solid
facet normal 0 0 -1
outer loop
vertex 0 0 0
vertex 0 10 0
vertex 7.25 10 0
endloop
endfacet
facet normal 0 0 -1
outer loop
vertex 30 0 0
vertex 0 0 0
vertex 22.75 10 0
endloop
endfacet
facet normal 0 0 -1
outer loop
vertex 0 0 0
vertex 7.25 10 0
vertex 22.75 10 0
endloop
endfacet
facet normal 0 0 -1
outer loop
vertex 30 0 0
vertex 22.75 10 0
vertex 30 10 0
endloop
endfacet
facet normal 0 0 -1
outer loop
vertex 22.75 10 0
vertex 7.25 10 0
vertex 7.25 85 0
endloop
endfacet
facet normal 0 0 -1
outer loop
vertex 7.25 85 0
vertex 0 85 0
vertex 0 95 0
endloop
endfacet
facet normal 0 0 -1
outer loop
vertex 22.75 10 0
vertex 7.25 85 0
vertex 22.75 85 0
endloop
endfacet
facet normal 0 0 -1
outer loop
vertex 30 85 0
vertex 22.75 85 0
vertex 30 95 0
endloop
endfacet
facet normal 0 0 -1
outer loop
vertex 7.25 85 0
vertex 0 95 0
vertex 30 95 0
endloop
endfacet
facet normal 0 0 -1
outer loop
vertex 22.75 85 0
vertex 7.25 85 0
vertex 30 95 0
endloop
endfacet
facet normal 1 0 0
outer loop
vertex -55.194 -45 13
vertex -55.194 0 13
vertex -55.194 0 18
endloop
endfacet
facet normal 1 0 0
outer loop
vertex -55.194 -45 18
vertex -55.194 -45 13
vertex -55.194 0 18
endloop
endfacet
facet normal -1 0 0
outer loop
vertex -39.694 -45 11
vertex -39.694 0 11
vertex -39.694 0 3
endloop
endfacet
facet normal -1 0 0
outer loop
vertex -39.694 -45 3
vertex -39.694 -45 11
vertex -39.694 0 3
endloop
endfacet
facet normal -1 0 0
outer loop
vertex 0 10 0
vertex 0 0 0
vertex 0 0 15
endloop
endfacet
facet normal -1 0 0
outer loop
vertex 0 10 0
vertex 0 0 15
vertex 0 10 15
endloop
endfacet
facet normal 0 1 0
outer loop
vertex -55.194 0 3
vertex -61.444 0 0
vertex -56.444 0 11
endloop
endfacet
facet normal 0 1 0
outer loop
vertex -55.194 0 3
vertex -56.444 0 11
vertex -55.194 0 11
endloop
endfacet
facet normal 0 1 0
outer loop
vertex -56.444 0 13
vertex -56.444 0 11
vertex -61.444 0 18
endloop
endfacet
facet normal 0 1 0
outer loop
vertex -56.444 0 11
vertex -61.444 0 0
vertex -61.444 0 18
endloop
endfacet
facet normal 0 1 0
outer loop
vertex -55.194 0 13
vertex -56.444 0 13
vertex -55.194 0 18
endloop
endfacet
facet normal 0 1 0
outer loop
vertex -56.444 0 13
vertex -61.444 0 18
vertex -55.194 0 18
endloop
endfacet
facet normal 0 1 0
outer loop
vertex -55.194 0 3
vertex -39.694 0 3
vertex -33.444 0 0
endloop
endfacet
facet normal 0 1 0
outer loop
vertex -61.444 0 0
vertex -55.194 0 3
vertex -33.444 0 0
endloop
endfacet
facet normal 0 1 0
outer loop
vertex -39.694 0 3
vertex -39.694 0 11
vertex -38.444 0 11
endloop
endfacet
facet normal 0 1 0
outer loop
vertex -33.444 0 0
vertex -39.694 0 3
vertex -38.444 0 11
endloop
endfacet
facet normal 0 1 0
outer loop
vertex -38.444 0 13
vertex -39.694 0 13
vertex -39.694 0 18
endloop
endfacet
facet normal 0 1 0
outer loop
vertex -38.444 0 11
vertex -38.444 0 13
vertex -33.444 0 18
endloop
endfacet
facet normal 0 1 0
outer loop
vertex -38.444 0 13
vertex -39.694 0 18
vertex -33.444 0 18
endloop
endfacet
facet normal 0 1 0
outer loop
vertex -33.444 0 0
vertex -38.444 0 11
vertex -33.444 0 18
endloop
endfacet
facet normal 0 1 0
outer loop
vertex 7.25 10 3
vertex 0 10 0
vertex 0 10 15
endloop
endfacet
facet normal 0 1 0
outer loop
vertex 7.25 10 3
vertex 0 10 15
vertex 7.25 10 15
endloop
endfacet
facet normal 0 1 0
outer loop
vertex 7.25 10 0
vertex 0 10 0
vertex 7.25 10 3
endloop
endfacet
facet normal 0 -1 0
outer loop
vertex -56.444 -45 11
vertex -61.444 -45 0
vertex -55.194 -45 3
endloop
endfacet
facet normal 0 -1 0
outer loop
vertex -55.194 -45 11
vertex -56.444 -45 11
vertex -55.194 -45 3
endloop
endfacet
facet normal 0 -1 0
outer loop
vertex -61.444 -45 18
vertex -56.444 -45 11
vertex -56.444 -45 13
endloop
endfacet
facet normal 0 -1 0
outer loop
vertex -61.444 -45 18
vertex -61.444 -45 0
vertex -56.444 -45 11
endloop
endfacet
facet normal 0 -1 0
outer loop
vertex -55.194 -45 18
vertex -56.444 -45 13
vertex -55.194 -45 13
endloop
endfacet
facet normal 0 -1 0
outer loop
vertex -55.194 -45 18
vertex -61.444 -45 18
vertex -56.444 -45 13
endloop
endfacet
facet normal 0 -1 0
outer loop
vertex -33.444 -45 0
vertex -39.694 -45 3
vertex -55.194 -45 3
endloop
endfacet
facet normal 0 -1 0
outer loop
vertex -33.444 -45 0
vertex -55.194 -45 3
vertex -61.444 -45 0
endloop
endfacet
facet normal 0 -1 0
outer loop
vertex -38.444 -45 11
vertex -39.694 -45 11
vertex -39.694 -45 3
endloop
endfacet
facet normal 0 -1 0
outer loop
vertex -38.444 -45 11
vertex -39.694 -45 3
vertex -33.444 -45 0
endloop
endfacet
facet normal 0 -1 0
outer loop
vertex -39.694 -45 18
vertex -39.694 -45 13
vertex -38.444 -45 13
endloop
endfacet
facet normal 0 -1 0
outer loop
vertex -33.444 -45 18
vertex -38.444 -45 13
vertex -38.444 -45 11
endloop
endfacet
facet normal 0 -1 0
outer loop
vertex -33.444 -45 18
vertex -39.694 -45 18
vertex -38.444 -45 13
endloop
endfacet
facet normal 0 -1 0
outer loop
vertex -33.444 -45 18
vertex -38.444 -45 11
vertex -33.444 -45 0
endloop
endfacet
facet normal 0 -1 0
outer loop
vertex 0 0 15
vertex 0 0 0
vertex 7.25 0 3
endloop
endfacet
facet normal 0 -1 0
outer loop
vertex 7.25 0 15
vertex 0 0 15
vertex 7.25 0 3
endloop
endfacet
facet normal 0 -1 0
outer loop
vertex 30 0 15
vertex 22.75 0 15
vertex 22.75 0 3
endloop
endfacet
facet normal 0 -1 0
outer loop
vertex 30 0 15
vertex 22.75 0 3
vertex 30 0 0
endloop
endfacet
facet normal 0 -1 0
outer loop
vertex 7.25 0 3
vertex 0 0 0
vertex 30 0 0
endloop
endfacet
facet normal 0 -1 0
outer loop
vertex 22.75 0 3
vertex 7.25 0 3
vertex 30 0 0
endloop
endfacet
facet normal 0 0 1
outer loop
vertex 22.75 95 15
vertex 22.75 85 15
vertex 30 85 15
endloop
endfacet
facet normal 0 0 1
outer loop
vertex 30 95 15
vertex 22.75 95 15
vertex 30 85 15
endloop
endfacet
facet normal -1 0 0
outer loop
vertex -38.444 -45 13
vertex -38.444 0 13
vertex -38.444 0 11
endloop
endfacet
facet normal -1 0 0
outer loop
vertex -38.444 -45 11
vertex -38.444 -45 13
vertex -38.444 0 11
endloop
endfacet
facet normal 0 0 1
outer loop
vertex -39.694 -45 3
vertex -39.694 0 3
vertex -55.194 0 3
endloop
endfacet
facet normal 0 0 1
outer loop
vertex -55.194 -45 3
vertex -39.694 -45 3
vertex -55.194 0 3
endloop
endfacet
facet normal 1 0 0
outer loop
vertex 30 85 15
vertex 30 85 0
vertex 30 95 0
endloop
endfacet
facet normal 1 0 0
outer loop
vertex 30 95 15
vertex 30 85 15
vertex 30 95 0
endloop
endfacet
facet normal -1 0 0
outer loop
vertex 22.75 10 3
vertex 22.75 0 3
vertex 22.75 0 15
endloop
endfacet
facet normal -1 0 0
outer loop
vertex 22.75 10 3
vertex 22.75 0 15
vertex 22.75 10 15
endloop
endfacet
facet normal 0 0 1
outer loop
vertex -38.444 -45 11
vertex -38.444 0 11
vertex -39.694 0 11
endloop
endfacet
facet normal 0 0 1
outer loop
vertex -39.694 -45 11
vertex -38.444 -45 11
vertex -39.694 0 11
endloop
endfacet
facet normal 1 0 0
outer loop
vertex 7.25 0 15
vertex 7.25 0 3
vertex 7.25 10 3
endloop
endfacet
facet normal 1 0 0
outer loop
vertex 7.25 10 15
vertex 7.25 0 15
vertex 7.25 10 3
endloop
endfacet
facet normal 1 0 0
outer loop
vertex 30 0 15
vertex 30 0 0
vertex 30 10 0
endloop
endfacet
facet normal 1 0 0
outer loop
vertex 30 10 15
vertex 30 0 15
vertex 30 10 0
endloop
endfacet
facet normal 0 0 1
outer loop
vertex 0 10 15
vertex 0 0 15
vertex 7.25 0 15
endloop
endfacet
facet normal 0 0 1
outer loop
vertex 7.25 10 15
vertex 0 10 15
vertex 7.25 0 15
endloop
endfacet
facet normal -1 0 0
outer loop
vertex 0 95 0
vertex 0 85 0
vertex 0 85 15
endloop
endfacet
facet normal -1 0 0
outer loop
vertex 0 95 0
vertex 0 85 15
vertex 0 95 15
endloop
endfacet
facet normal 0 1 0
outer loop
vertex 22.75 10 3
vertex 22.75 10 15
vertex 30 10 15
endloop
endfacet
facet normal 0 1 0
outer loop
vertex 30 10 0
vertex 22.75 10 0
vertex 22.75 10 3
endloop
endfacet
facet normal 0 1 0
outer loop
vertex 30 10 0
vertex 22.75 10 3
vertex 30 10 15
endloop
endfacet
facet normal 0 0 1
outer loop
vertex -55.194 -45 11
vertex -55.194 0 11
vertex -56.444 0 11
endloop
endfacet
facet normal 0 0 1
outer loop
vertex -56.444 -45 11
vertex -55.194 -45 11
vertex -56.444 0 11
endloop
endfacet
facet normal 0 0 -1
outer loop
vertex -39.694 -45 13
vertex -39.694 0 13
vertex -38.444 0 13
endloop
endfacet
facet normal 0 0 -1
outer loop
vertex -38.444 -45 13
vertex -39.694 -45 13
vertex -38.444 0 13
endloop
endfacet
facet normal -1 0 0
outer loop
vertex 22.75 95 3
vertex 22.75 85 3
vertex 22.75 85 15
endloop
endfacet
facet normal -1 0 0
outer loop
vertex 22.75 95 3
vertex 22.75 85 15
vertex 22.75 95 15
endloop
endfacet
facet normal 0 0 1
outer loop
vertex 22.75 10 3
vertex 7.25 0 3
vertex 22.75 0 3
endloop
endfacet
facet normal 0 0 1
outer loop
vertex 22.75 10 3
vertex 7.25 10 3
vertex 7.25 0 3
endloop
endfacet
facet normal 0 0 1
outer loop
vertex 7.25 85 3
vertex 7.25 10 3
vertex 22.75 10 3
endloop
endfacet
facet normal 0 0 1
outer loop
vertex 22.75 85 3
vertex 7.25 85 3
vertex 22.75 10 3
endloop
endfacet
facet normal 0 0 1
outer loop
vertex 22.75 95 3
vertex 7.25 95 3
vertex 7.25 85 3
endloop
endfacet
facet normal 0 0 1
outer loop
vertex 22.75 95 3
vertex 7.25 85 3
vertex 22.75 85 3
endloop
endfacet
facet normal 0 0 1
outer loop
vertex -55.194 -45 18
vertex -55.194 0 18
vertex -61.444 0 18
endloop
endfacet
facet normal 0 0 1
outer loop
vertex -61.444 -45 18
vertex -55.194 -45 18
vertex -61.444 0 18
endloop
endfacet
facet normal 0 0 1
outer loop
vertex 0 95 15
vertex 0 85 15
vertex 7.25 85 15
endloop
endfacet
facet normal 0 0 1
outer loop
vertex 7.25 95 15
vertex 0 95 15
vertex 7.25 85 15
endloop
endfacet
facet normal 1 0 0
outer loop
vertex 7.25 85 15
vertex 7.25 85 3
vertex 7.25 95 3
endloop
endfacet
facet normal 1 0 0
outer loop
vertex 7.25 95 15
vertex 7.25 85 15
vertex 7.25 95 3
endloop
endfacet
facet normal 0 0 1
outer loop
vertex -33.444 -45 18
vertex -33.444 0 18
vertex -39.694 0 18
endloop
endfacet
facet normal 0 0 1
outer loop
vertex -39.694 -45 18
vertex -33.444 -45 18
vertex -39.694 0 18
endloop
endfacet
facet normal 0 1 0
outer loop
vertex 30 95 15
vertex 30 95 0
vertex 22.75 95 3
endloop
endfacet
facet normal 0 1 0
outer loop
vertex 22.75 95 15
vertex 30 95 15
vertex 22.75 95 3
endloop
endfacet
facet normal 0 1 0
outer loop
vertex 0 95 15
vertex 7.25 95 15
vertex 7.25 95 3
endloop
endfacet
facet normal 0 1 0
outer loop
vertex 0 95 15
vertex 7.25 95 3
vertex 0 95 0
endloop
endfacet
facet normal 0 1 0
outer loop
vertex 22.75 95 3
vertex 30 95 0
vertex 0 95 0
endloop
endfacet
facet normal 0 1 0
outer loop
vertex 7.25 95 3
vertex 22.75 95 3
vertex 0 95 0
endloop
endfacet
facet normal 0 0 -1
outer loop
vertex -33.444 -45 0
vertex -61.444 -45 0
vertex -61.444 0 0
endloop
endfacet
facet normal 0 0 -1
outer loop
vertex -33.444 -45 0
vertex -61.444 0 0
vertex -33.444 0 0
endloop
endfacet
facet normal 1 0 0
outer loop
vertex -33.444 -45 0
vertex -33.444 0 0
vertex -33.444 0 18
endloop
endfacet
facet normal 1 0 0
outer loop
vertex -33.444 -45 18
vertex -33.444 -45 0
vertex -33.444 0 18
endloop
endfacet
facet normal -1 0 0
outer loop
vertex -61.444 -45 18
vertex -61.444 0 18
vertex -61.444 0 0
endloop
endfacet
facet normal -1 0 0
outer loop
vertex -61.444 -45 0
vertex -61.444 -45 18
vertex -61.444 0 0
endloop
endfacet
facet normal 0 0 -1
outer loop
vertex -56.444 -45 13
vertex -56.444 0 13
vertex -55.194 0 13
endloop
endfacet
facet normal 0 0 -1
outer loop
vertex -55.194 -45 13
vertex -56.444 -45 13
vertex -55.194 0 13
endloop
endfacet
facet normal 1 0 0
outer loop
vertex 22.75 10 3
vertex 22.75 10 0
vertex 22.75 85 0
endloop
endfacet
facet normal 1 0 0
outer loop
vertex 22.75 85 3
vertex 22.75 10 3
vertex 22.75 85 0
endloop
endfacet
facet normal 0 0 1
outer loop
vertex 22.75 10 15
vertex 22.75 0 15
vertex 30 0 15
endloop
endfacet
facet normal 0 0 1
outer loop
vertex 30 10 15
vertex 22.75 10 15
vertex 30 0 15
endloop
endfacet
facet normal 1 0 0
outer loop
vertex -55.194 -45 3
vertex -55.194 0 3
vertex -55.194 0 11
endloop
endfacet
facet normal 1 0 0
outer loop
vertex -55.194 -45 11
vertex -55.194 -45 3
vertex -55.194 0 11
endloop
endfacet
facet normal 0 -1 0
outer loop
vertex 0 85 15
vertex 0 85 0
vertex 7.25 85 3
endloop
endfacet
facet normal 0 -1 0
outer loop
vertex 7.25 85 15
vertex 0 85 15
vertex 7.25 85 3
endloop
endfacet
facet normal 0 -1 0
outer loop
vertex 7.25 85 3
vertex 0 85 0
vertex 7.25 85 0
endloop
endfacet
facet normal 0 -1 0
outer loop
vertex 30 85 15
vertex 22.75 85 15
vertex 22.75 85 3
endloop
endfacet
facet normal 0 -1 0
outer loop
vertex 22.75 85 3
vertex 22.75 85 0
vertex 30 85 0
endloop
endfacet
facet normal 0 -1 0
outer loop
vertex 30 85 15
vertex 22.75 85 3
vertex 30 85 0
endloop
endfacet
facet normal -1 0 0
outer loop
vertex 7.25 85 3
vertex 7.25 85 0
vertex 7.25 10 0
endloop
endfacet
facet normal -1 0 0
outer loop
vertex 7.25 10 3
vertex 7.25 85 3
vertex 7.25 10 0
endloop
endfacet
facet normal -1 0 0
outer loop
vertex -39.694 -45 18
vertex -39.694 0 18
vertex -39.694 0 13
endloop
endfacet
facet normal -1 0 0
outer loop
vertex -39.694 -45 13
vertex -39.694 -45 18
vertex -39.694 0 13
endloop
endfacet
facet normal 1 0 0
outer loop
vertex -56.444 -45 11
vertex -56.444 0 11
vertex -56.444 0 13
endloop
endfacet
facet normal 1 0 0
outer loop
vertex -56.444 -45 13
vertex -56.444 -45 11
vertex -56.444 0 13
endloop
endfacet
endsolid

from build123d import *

# Parameters (mm, degrees)
F0_W     = 7.25
F0_H     = 10
F1_DEPTH = 15
F2_DEPTH = 3
F4_DEPTH = 45


with BuildPart() as f1:
    # F0 (on Top) → F1 (new body)
    with BuildSketch(Plane.XY):
        with Locations((3.625, 90)):
            Rectangle(F0_W, F0_H)
        with Locations((26.375, 5)):
            Rectangle(F0_W, F0_H)
        with Locations((26.375, 90)):
            Rectangle(F0_W, F0_H)
        with Locations((3.625, 5)):
            Rectangle(F0_W, F0_H)
    extrude(amount=F1_DEPTH)

    # F0 (on Top) → F2 (join)
    with BuildSketch(Plane.XY):
        Polygon((7.25, 10), (7.25, 0), (22.75, 0), (22.75, 10), (22.75, 85), (22.75, 95), (7.25, 95), (7.25, 85), align=None)
    extrude(amount=F2_DEPTH)


with BuildPart() as f4:
    # F3 (on Front) → F4 (new body)
    with BuildSketch(Plane.XZ):
        Polygon((-61.444285, 18), (-61.444285, 0), (-33.444285, 0), (-33.444285, 18), (-39.694285, 18), (-39.694285, 13), (-38.444285, 13), (-38.444285, 11), (-39.694285, 11), (-39.694285, 3), (-55.194285, 3), (-55.194285, 11), (-56.444285, 11), (-56.444285, 13), (-55.194285, 13), (-55.194285, 18), align=None)
    extrude(amount=F4_DEPTH)


solid = Compound([f1.part, f4.part])
